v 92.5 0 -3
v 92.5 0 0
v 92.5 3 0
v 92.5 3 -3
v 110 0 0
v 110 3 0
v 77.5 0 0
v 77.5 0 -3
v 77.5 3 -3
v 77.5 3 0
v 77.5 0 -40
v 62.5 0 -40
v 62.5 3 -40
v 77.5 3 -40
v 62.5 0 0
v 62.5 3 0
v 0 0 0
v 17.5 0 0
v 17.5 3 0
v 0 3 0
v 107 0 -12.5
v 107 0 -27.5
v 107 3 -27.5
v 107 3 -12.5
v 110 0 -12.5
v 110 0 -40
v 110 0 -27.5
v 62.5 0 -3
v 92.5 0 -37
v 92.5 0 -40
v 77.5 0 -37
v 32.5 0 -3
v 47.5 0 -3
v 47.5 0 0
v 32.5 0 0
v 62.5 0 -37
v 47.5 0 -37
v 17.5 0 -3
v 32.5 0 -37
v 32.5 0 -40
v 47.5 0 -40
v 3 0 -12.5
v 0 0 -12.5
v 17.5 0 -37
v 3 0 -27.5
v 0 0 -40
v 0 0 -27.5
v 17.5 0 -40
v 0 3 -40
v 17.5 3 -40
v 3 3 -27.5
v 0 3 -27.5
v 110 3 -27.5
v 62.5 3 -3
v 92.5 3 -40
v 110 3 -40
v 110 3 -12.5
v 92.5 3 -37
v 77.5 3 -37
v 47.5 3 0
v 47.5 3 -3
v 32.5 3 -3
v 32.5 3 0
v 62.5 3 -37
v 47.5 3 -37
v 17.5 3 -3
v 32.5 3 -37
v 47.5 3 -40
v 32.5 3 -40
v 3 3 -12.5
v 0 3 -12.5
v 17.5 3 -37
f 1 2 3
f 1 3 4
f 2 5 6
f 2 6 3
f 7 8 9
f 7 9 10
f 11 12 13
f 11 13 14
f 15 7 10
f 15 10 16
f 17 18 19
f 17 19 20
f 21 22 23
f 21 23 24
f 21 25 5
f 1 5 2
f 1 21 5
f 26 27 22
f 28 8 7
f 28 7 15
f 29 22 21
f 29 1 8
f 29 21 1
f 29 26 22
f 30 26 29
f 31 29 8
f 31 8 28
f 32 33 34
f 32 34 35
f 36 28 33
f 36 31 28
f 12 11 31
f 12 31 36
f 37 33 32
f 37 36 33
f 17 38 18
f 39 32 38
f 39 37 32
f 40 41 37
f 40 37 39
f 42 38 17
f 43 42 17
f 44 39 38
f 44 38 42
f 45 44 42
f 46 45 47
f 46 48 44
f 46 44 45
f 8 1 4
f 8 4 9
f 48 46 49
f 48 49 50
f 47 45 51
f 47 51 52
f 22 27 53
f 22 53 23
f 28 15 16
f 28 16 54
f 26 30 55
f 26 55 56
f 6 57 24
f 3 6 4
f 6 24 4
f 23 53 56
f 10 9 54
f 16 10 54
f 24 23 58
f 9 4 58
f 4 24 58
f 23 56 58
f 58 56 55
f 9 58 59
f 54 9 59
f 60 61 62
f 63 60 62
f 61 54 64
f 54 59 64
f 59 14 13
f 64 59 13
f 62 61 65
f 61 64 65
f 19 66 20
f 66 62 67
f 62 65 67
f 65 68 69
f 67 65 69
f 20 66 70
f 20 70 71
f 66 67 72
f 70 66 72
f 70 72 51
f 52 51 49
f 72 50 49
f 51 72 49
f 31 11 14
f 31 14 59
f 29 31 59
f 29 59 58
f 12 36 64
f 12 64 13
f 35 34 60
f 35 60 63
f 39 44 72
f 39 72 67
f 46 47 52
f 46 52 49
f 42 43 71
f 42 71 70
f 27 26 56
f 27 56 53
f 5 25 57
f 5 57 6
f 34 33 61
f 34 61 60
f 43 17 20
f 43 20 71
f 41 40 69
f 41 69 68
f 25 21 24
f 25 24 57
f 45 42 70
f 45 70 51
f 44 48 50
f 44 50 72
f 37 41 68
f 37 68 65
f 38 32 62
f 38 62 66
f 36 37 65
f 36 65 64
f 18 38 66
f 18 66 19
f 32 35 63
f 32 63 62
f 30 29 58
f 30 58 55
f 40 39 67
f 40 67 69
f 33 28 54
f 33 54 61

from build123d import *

# Parameters (mm, degrees)
SALIENTE_EXTRUIR2_DEPTH = 3


with BuildPart() as part:
    # Croquis1 → Saliente-Extruir2 (new body)
    with BuildSketch(Plane(origin=(0, 0, 0), x_dir=(1, 0, 0), z_dir=(0, 1, 0))):
        Polygon((3, 12.5), (3, 27.5), (0, 27.5), (0, 40), (17.5, 40), (17.5, 37), (32.5, 37), (32.5, 40), (47.5, 40), (47.5, 37), (62.5, 37), (62.5, 40), (77.5, 40), (77.5, 37), (92.5, 37), (92.5, 40), (110, 40), (110, 27.5), (107, 27.5), (107, 12.5), (110, 12.5), (110, 0), (92.5, 0), (92.5, 3), (77.5, 3), (77.5, 0), (62.5, 0), (62.5, 3), (47.5, 3), (47.5, 0), (32.5, 0), (32.5, 3), (17.5, 3), (17.5, 0), (0, 0), (0, 12.5), align=None)
    extrude(amount=SALIENTE_EXTRUIR2_DEPTH)


solid = part.part
